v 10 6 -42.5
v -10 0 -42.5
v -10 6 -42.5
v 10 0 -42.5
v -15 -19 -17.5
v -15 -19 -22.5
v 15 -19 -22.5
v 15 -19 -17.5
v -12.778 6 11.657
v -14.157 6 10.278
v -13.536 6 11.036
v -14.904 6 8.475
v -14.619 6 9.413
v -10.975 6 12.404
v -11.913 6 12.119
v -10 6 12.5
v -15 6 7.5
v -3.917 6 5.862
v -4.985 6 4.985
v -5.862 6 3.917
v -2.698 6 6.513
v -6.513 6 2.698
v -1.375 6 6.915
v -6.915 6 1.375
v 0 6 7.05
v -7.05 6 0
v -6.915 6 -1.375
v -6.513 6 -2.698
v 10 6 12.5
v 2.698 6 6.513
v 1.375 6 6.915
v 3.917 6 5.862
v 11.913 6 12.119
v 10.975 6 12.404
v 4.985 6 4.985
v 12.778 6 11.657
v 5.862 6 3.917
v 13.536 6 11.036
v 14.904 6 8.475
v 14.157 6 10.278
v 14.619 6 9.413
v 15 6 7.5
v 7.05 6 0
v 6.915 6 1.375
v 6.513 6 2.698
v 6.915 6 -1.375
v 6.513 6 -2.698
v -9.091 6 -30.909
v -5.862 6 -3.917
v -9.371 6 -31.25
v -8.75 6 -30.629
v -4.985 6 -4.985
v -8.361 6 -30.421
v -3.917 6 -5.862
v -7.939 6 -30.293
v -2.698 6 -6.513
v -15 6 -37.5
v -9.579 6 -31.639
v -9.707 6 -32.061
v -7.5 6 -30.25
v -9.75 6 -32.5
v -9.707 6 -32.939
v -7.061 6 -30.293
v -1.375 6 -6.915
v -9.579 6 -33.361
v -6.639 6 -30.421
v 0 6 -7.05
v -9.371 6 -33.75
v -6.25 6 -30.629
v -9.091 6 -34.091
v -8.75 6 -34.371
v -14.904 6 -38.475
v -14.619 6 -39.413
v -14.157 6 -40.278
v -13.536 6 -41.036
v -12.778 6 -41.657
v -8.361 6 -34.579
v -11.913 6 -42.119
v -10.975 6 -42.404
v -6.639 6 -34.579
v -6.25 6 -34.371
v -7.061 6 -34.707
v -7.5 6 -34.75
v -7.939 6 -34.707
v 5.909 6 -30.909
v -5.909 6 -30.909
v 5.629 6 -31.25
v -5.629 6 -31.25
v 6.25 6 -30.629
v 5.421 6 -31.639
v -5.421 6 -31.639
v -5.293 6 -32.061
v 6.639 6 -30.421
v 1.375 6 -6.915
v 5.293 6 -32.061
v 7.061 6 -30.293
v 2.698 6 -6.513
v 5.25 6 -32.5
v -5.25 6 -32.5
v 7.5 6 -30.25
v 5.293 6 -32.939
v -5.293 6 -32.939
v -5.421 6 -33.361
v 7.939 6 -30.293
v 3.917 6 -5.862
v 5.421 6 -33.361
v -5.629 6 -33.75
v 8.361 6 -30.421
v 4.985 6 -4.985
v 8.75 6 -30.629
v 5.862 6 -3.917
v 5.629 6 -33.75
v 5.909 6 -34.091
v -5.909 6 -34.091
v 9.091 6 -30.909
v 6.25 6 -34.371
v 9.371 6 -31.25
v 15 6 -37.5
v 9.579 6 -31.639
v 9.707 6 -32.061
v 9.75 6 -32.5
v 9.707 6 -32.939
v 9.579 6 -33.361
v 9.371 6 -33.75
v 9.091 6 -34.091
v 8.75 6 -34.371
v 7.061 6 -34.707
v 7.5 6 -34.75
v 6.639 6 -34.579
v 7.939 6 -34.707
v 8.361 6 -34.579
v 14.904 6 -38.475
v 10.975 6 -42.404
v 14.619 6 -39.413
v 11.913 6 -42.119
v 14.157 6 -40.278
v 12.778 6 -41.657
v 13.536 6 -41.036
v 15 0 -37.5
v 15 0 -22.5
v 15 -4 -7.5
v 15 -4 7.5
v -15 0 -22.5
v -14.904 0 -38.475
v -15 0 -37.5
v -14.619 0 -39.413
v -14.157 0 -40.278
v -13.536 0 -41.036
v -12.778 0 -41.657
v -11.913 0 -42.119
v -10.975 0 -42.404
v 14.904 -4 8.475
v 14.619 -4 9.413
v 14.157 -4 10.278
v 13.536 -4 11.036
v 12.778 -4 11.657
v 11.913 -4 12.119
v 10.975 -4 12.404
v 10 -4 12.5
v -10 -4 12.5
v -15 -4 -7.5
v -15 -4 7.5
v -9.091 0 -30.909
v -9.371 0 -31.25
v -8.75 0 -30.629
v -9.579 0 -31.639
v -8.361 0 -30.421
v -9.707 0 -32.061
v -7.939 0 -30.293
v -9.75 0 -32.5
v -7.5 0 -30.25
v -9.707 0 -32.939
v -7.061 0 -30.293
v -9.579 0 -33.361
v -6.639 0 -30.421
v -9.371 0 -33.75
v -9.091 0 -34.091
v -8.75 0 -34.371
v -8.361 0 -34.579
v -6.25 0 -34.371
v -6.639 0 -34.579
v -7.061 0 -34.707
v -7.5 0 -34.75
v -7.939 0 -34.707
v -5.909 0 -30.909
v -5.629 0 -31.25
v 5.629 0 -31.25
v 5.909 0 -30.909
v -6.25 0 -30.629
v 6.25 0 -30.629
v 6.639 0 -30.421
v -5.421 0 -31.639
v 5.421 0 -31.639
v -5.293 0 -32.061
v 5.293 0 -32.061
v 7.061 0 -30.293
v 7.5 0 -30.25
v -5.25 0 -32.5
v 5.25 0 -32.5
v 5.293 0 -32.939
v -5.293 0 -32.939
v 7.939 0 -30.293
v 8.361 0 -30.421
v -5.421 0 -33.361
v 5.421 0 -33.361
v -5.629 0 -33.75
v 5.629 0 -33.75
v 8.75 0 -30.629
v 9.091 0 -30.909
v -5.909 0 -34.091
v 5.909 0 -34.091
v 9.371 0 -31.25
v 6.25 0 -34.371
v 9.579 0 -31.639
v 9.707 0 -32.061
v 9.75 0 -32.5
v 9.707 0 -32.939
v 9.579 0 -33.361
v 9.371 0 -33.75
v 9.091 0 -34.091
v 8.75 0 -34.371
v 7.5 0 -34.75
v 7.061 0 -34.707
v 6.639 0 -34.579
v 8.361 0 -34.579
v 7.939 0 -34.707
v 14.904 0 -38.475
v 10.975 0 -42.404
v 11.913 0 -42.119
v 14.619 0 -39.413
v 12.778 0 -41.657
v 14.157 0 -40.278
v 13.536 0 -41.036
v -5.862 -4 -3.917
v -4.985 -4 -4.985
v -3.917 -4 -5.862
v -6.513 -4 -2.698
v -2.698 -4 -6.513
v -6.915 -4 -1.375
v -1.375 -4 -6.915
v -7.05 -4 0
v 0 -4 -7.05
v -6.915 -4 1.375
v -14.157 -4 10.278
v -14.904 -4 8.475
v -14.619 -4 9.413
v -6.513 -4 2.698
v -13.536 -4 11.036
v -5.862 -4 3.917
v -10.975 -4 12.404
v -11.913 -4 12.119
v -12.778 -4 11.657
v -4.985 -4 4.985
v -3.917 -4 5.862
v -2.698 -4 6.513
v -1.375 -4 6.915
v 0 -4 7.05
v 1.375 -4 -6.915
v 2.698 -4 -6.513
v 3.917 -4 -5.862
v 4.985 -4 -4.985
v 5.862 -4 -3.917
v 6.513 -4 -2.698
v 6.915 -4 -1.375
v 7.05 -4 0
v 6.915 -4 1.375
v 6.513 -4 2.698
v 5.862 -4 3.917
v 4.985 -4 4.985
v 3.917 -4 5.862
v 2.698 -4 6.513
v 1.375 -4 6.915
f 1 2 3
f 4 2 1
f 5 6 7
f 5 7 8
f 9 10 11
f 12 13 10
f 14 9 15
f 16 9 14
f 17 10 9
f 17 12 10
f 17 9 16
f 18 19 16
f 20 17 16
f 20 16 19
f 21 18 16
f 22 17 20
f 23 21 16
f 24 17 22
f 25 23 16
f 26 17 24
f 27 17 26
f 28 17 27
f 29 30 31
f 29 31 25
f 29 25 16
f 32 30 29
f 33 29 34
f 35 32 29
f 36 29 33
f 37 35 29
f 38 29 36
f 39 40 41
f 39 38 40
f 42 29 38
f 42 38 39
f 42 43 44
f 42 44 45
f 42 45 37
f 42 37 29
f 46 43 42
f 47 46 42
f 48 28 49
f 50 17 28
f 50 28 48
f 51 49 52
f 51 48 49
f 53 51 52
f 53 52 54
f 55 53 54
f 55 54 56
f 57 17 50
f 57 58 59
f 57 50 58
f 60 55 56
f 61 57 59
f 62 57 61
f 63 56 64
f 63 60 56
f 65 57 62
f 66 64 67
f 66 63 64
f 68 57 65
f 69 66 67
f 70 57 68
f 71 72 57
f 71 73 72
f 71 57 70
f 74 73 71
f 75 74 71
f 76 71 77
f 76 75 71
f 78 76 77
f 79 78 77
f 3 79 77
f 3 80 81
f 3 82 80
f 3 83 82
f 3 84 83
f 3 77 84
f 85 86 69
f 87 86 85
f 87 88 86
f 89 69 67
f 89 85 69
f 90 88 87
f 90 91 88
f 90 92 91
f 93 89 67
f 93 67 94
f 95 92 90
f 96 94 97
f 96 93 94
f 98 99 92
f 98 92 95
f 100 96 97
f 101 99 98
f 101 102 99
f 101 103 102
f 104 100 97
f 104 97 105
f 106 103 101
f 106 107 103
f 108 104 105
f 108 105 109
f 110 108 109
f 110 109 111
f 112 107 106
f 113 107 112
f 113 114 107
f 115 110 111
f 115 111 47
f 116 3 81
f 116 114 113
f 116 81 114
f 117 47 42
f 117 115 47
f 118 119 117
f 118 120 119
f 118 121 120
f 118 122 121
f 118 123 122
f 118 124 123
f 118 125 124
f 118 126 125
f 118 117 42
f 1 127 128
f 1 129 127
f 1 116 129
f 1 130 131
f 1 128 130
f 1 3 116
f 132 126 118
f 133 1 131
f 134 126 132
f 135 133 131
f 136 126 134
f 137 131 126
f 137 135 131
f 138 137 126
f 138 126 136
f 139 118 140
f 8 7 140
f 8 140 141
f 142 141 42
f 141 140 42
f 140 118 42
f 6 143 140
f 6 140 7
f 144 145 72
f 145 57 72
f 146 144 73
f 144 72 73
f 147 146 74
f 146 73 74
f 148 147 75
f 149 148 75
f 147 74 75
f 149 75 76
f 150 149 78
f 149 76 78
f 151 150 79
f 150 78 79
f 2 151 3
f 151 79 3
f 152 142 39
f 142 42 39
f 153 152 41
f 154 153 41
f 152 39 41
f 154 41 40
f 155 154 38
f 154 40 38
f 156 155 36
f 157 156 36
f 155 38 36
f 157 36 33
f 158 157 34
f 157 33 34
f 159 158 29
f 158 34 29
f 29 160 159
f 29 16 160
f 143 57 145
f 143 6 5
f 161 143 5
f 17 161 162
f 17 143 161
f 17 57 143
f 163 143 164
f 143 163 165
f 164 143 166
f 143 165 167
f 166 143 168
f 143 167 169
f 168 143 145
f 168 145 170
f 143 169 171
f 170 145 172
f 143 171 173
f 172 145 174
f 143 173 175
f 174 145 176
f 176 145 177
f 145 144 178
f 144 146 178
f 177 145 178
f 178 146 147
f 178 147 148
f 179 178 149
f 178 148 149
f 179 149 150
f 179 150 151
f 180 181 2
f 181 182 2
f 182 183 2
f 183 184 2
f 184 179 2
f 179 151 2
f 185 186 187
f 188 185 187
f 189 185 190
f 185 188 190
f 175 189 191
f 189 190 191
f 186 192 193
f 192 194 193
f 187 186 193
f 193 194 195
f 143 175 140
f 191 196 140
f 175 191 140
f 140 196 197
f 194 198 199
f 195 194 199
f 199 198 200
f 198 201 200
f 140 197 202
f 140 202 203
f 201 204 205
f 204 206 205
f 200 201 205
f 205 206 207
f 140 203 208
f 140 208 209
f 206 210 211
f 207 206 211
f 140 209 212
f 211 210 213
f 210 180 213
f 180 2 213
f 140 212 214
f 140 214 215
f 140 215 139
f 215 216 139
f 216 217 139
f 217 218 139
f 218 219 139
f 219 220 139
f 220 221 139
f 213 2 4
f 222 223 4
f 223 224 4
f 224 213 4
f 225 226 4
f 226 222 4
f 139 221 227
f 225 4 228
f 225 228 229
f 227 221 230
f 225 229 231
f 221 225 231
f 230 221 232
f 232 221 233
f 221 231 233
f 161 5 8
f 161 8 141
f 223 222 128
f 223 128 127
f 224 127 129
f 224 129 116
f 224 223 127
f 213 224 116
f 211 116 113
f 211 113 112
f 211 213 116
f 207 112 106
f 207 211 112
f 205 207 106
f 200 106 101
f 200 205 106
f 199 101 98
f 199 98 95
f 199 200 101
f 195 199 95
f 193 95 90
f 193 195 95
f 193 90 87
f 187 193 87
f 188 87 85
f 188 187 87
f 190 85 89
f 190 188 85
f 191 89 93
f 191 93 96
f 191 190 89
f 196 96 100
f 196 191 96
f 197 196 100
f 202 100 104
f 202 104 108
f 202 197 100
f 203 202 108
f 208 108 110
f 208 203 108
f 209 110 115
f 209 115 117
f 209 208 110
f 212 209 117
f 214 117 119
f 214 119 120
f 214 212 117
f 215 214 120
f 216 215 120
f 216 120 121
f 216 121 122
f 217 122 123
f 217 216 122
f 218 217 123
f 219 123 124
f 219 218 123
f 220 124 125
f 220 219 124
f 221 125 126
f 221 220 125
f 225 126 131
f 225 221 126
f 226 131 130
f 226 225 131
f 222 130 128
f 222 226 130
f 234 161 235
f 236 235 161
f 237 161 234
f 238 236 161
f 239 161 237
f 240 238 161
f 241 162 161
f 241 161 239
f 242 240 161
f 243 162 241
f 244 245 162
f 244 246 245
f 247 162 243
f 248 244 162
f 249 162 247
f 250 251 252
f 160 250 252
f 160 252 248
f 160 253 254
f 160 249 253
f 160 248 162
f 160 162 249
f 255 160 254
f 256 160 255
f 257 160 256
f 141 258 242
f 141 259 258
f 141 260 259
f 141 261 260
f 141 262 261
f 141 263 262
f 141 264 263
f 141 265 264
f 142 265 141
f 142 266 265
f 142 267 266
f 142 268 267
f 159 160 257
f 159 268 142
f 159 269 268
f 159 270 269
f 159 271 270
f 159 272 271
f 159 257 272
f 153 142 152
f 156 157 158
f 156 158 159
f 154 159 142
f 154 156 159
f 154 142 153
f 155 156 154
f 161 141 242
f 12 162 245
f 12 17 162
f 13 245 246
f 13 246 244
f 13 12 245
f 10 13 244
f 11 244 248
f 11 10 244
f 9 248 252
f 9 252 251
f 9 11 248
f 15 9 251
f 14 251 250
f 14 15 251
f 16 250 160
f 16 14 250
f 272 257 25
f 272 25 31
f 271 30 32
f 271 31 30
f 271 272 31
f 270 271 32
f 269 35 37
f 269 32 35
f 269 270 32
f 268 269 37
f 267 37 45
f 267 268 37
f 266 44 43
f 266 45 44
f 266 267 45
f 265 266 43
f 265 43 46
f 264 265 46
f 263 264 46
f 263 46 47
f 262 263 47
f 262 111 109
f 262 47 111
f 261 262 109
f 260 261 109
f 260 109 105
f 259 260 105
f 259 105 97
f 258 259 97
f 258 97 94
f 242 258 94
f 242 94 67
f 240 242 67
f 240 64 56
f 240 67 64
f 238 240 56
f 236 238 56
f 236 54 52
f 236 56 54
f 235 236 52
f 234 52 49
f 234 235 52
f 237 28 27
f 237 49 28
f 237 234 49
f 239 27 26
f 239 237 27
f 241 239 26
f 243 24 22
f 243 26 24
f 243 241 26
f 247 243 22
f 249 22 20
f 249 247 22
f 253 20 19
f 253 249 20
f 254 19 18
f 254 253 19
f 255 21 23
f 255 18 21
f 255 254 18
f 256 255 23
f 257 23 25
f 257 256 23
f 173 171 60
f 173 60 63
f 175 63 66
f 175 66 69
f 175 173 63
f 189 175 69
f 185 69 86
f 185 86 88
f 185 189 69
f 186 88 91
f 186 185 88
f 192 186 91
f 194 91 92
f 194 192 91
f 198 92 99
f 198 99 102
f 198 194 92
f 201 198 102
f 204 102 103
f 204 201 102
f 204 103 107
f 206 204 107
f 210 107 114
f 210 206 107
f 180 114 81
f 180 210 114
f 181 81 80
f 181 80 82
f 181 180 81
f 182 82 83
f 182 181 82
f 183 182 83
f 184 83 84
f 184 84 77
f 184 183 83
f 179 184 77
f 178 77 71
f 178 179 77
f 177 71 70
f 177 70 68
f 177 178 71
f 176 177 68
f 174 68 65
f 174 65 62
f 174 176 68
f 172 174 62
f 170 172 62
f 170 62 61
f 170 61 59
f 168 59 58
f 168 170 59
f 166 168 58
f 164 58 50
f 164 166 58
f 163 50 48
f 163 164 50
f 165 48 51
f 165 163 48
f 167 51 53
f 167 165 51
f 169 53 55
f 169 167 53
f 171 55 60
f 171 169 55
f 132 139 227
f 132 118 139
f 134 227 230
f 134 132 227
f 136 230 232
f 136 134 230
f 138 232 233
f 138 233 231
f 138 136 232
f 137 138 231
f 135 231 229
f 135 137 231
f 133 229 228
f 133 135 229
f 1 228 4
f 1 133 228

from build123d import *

# Parameters (mm, degrees)
SKETCH1_W               = 30
SKETCH1_H               = 55
SKETCH1_R               = 2.25
BOSS_EXTRUDE1_DEPTH     = 6
SKETCH3_W               = 30
SKETCH3_H               = 35
BOSS_EXTRUDE2_DEPTH     = 4
BOSS_EXTRUDE3_DEPTH     = 30
CUT_EXTRUDE1_DEPTH      = 52.53882032
CUT_EXTRUDE1_DEPTH_BACK = 52.53882032
SKETCH2_R               = 7.05
FILLET1_R               = 5


with BuildPart() as part:
    # Sketch1 → Boss-Extrude1 (new body)
    with BuildSketch(Plane(origin=(0, 0, 0), x_dir=(1, 0, 0), z_dir=(0, 1, 0))):
        with Locations((0, 15)):
            Rectangle(SKETCH1_W, SKETCH1_H)
        with Locations(Location((-7.5, 32.5, 0), (0, 0, 270))):
            Circle(SKETCH1_R, mode=Mode.SUBTRACT)
        with Locations(Location((7.5, 32.5, 0), (0, 0, 90))):
            Circle(SKETCH1_R, mode=Mode.SUBTRACT)
    extrude(amount=BOSS_EXTRUDE1_DEPTH)

    # Sketch3 → Boss-Extrude2 (add)
    with BuildSketch(Plane.XZ):
        with Locations((0, -5)):
            Rectangle(SKETCH3_W, SKETCH3_H)
    extrude(amount=BOSS_EXTRUDE2_DEPTH)

    # Sketch4 → Boss-Extrude3 (add)
    with BuildSketch(Plane.ZY.offset(15)):
        Polygon((-22.5, -4), (-22.5, -19), (-17.5, -19), (-7.5, -4), align=None)
    extrude(amount=-BOSS_EXTRUDE3_DEPTH)

    # Sketch2 → Cut-Extrude1 (cut, two sides: drawn at the far end of the back side and taken through both)
    with BuildSketch(Plane(origin=(0, 6, 0), x_dir=(1, 0, 0), z_dir=(0, 1, 0)).offset(-CUT_EXTRUDE1_DEPTH_BACK)):
        with Locations(Location((0, 0, 0), (0, 0, 270))):
            Circle(SKETCH2_R)
    extrude(amount=CUT_EXTRUDE1_DEPTH + CUT_EXTRUDE1_DEPTH_BACK, mode=Mode.SUBTRACT)

    # Fillet1
    fillet1_edges = [part.edges().sort_by_distance(p)[0] for p in [
        (-15, 3, -42.5),
        (15, 3, -42.5),
        (15, 1, 12.5),
        (-15, 1, 12.5),
    ]]
    fillet(fillet1_edges, radius=FILLET1_R)


solid = part.part
